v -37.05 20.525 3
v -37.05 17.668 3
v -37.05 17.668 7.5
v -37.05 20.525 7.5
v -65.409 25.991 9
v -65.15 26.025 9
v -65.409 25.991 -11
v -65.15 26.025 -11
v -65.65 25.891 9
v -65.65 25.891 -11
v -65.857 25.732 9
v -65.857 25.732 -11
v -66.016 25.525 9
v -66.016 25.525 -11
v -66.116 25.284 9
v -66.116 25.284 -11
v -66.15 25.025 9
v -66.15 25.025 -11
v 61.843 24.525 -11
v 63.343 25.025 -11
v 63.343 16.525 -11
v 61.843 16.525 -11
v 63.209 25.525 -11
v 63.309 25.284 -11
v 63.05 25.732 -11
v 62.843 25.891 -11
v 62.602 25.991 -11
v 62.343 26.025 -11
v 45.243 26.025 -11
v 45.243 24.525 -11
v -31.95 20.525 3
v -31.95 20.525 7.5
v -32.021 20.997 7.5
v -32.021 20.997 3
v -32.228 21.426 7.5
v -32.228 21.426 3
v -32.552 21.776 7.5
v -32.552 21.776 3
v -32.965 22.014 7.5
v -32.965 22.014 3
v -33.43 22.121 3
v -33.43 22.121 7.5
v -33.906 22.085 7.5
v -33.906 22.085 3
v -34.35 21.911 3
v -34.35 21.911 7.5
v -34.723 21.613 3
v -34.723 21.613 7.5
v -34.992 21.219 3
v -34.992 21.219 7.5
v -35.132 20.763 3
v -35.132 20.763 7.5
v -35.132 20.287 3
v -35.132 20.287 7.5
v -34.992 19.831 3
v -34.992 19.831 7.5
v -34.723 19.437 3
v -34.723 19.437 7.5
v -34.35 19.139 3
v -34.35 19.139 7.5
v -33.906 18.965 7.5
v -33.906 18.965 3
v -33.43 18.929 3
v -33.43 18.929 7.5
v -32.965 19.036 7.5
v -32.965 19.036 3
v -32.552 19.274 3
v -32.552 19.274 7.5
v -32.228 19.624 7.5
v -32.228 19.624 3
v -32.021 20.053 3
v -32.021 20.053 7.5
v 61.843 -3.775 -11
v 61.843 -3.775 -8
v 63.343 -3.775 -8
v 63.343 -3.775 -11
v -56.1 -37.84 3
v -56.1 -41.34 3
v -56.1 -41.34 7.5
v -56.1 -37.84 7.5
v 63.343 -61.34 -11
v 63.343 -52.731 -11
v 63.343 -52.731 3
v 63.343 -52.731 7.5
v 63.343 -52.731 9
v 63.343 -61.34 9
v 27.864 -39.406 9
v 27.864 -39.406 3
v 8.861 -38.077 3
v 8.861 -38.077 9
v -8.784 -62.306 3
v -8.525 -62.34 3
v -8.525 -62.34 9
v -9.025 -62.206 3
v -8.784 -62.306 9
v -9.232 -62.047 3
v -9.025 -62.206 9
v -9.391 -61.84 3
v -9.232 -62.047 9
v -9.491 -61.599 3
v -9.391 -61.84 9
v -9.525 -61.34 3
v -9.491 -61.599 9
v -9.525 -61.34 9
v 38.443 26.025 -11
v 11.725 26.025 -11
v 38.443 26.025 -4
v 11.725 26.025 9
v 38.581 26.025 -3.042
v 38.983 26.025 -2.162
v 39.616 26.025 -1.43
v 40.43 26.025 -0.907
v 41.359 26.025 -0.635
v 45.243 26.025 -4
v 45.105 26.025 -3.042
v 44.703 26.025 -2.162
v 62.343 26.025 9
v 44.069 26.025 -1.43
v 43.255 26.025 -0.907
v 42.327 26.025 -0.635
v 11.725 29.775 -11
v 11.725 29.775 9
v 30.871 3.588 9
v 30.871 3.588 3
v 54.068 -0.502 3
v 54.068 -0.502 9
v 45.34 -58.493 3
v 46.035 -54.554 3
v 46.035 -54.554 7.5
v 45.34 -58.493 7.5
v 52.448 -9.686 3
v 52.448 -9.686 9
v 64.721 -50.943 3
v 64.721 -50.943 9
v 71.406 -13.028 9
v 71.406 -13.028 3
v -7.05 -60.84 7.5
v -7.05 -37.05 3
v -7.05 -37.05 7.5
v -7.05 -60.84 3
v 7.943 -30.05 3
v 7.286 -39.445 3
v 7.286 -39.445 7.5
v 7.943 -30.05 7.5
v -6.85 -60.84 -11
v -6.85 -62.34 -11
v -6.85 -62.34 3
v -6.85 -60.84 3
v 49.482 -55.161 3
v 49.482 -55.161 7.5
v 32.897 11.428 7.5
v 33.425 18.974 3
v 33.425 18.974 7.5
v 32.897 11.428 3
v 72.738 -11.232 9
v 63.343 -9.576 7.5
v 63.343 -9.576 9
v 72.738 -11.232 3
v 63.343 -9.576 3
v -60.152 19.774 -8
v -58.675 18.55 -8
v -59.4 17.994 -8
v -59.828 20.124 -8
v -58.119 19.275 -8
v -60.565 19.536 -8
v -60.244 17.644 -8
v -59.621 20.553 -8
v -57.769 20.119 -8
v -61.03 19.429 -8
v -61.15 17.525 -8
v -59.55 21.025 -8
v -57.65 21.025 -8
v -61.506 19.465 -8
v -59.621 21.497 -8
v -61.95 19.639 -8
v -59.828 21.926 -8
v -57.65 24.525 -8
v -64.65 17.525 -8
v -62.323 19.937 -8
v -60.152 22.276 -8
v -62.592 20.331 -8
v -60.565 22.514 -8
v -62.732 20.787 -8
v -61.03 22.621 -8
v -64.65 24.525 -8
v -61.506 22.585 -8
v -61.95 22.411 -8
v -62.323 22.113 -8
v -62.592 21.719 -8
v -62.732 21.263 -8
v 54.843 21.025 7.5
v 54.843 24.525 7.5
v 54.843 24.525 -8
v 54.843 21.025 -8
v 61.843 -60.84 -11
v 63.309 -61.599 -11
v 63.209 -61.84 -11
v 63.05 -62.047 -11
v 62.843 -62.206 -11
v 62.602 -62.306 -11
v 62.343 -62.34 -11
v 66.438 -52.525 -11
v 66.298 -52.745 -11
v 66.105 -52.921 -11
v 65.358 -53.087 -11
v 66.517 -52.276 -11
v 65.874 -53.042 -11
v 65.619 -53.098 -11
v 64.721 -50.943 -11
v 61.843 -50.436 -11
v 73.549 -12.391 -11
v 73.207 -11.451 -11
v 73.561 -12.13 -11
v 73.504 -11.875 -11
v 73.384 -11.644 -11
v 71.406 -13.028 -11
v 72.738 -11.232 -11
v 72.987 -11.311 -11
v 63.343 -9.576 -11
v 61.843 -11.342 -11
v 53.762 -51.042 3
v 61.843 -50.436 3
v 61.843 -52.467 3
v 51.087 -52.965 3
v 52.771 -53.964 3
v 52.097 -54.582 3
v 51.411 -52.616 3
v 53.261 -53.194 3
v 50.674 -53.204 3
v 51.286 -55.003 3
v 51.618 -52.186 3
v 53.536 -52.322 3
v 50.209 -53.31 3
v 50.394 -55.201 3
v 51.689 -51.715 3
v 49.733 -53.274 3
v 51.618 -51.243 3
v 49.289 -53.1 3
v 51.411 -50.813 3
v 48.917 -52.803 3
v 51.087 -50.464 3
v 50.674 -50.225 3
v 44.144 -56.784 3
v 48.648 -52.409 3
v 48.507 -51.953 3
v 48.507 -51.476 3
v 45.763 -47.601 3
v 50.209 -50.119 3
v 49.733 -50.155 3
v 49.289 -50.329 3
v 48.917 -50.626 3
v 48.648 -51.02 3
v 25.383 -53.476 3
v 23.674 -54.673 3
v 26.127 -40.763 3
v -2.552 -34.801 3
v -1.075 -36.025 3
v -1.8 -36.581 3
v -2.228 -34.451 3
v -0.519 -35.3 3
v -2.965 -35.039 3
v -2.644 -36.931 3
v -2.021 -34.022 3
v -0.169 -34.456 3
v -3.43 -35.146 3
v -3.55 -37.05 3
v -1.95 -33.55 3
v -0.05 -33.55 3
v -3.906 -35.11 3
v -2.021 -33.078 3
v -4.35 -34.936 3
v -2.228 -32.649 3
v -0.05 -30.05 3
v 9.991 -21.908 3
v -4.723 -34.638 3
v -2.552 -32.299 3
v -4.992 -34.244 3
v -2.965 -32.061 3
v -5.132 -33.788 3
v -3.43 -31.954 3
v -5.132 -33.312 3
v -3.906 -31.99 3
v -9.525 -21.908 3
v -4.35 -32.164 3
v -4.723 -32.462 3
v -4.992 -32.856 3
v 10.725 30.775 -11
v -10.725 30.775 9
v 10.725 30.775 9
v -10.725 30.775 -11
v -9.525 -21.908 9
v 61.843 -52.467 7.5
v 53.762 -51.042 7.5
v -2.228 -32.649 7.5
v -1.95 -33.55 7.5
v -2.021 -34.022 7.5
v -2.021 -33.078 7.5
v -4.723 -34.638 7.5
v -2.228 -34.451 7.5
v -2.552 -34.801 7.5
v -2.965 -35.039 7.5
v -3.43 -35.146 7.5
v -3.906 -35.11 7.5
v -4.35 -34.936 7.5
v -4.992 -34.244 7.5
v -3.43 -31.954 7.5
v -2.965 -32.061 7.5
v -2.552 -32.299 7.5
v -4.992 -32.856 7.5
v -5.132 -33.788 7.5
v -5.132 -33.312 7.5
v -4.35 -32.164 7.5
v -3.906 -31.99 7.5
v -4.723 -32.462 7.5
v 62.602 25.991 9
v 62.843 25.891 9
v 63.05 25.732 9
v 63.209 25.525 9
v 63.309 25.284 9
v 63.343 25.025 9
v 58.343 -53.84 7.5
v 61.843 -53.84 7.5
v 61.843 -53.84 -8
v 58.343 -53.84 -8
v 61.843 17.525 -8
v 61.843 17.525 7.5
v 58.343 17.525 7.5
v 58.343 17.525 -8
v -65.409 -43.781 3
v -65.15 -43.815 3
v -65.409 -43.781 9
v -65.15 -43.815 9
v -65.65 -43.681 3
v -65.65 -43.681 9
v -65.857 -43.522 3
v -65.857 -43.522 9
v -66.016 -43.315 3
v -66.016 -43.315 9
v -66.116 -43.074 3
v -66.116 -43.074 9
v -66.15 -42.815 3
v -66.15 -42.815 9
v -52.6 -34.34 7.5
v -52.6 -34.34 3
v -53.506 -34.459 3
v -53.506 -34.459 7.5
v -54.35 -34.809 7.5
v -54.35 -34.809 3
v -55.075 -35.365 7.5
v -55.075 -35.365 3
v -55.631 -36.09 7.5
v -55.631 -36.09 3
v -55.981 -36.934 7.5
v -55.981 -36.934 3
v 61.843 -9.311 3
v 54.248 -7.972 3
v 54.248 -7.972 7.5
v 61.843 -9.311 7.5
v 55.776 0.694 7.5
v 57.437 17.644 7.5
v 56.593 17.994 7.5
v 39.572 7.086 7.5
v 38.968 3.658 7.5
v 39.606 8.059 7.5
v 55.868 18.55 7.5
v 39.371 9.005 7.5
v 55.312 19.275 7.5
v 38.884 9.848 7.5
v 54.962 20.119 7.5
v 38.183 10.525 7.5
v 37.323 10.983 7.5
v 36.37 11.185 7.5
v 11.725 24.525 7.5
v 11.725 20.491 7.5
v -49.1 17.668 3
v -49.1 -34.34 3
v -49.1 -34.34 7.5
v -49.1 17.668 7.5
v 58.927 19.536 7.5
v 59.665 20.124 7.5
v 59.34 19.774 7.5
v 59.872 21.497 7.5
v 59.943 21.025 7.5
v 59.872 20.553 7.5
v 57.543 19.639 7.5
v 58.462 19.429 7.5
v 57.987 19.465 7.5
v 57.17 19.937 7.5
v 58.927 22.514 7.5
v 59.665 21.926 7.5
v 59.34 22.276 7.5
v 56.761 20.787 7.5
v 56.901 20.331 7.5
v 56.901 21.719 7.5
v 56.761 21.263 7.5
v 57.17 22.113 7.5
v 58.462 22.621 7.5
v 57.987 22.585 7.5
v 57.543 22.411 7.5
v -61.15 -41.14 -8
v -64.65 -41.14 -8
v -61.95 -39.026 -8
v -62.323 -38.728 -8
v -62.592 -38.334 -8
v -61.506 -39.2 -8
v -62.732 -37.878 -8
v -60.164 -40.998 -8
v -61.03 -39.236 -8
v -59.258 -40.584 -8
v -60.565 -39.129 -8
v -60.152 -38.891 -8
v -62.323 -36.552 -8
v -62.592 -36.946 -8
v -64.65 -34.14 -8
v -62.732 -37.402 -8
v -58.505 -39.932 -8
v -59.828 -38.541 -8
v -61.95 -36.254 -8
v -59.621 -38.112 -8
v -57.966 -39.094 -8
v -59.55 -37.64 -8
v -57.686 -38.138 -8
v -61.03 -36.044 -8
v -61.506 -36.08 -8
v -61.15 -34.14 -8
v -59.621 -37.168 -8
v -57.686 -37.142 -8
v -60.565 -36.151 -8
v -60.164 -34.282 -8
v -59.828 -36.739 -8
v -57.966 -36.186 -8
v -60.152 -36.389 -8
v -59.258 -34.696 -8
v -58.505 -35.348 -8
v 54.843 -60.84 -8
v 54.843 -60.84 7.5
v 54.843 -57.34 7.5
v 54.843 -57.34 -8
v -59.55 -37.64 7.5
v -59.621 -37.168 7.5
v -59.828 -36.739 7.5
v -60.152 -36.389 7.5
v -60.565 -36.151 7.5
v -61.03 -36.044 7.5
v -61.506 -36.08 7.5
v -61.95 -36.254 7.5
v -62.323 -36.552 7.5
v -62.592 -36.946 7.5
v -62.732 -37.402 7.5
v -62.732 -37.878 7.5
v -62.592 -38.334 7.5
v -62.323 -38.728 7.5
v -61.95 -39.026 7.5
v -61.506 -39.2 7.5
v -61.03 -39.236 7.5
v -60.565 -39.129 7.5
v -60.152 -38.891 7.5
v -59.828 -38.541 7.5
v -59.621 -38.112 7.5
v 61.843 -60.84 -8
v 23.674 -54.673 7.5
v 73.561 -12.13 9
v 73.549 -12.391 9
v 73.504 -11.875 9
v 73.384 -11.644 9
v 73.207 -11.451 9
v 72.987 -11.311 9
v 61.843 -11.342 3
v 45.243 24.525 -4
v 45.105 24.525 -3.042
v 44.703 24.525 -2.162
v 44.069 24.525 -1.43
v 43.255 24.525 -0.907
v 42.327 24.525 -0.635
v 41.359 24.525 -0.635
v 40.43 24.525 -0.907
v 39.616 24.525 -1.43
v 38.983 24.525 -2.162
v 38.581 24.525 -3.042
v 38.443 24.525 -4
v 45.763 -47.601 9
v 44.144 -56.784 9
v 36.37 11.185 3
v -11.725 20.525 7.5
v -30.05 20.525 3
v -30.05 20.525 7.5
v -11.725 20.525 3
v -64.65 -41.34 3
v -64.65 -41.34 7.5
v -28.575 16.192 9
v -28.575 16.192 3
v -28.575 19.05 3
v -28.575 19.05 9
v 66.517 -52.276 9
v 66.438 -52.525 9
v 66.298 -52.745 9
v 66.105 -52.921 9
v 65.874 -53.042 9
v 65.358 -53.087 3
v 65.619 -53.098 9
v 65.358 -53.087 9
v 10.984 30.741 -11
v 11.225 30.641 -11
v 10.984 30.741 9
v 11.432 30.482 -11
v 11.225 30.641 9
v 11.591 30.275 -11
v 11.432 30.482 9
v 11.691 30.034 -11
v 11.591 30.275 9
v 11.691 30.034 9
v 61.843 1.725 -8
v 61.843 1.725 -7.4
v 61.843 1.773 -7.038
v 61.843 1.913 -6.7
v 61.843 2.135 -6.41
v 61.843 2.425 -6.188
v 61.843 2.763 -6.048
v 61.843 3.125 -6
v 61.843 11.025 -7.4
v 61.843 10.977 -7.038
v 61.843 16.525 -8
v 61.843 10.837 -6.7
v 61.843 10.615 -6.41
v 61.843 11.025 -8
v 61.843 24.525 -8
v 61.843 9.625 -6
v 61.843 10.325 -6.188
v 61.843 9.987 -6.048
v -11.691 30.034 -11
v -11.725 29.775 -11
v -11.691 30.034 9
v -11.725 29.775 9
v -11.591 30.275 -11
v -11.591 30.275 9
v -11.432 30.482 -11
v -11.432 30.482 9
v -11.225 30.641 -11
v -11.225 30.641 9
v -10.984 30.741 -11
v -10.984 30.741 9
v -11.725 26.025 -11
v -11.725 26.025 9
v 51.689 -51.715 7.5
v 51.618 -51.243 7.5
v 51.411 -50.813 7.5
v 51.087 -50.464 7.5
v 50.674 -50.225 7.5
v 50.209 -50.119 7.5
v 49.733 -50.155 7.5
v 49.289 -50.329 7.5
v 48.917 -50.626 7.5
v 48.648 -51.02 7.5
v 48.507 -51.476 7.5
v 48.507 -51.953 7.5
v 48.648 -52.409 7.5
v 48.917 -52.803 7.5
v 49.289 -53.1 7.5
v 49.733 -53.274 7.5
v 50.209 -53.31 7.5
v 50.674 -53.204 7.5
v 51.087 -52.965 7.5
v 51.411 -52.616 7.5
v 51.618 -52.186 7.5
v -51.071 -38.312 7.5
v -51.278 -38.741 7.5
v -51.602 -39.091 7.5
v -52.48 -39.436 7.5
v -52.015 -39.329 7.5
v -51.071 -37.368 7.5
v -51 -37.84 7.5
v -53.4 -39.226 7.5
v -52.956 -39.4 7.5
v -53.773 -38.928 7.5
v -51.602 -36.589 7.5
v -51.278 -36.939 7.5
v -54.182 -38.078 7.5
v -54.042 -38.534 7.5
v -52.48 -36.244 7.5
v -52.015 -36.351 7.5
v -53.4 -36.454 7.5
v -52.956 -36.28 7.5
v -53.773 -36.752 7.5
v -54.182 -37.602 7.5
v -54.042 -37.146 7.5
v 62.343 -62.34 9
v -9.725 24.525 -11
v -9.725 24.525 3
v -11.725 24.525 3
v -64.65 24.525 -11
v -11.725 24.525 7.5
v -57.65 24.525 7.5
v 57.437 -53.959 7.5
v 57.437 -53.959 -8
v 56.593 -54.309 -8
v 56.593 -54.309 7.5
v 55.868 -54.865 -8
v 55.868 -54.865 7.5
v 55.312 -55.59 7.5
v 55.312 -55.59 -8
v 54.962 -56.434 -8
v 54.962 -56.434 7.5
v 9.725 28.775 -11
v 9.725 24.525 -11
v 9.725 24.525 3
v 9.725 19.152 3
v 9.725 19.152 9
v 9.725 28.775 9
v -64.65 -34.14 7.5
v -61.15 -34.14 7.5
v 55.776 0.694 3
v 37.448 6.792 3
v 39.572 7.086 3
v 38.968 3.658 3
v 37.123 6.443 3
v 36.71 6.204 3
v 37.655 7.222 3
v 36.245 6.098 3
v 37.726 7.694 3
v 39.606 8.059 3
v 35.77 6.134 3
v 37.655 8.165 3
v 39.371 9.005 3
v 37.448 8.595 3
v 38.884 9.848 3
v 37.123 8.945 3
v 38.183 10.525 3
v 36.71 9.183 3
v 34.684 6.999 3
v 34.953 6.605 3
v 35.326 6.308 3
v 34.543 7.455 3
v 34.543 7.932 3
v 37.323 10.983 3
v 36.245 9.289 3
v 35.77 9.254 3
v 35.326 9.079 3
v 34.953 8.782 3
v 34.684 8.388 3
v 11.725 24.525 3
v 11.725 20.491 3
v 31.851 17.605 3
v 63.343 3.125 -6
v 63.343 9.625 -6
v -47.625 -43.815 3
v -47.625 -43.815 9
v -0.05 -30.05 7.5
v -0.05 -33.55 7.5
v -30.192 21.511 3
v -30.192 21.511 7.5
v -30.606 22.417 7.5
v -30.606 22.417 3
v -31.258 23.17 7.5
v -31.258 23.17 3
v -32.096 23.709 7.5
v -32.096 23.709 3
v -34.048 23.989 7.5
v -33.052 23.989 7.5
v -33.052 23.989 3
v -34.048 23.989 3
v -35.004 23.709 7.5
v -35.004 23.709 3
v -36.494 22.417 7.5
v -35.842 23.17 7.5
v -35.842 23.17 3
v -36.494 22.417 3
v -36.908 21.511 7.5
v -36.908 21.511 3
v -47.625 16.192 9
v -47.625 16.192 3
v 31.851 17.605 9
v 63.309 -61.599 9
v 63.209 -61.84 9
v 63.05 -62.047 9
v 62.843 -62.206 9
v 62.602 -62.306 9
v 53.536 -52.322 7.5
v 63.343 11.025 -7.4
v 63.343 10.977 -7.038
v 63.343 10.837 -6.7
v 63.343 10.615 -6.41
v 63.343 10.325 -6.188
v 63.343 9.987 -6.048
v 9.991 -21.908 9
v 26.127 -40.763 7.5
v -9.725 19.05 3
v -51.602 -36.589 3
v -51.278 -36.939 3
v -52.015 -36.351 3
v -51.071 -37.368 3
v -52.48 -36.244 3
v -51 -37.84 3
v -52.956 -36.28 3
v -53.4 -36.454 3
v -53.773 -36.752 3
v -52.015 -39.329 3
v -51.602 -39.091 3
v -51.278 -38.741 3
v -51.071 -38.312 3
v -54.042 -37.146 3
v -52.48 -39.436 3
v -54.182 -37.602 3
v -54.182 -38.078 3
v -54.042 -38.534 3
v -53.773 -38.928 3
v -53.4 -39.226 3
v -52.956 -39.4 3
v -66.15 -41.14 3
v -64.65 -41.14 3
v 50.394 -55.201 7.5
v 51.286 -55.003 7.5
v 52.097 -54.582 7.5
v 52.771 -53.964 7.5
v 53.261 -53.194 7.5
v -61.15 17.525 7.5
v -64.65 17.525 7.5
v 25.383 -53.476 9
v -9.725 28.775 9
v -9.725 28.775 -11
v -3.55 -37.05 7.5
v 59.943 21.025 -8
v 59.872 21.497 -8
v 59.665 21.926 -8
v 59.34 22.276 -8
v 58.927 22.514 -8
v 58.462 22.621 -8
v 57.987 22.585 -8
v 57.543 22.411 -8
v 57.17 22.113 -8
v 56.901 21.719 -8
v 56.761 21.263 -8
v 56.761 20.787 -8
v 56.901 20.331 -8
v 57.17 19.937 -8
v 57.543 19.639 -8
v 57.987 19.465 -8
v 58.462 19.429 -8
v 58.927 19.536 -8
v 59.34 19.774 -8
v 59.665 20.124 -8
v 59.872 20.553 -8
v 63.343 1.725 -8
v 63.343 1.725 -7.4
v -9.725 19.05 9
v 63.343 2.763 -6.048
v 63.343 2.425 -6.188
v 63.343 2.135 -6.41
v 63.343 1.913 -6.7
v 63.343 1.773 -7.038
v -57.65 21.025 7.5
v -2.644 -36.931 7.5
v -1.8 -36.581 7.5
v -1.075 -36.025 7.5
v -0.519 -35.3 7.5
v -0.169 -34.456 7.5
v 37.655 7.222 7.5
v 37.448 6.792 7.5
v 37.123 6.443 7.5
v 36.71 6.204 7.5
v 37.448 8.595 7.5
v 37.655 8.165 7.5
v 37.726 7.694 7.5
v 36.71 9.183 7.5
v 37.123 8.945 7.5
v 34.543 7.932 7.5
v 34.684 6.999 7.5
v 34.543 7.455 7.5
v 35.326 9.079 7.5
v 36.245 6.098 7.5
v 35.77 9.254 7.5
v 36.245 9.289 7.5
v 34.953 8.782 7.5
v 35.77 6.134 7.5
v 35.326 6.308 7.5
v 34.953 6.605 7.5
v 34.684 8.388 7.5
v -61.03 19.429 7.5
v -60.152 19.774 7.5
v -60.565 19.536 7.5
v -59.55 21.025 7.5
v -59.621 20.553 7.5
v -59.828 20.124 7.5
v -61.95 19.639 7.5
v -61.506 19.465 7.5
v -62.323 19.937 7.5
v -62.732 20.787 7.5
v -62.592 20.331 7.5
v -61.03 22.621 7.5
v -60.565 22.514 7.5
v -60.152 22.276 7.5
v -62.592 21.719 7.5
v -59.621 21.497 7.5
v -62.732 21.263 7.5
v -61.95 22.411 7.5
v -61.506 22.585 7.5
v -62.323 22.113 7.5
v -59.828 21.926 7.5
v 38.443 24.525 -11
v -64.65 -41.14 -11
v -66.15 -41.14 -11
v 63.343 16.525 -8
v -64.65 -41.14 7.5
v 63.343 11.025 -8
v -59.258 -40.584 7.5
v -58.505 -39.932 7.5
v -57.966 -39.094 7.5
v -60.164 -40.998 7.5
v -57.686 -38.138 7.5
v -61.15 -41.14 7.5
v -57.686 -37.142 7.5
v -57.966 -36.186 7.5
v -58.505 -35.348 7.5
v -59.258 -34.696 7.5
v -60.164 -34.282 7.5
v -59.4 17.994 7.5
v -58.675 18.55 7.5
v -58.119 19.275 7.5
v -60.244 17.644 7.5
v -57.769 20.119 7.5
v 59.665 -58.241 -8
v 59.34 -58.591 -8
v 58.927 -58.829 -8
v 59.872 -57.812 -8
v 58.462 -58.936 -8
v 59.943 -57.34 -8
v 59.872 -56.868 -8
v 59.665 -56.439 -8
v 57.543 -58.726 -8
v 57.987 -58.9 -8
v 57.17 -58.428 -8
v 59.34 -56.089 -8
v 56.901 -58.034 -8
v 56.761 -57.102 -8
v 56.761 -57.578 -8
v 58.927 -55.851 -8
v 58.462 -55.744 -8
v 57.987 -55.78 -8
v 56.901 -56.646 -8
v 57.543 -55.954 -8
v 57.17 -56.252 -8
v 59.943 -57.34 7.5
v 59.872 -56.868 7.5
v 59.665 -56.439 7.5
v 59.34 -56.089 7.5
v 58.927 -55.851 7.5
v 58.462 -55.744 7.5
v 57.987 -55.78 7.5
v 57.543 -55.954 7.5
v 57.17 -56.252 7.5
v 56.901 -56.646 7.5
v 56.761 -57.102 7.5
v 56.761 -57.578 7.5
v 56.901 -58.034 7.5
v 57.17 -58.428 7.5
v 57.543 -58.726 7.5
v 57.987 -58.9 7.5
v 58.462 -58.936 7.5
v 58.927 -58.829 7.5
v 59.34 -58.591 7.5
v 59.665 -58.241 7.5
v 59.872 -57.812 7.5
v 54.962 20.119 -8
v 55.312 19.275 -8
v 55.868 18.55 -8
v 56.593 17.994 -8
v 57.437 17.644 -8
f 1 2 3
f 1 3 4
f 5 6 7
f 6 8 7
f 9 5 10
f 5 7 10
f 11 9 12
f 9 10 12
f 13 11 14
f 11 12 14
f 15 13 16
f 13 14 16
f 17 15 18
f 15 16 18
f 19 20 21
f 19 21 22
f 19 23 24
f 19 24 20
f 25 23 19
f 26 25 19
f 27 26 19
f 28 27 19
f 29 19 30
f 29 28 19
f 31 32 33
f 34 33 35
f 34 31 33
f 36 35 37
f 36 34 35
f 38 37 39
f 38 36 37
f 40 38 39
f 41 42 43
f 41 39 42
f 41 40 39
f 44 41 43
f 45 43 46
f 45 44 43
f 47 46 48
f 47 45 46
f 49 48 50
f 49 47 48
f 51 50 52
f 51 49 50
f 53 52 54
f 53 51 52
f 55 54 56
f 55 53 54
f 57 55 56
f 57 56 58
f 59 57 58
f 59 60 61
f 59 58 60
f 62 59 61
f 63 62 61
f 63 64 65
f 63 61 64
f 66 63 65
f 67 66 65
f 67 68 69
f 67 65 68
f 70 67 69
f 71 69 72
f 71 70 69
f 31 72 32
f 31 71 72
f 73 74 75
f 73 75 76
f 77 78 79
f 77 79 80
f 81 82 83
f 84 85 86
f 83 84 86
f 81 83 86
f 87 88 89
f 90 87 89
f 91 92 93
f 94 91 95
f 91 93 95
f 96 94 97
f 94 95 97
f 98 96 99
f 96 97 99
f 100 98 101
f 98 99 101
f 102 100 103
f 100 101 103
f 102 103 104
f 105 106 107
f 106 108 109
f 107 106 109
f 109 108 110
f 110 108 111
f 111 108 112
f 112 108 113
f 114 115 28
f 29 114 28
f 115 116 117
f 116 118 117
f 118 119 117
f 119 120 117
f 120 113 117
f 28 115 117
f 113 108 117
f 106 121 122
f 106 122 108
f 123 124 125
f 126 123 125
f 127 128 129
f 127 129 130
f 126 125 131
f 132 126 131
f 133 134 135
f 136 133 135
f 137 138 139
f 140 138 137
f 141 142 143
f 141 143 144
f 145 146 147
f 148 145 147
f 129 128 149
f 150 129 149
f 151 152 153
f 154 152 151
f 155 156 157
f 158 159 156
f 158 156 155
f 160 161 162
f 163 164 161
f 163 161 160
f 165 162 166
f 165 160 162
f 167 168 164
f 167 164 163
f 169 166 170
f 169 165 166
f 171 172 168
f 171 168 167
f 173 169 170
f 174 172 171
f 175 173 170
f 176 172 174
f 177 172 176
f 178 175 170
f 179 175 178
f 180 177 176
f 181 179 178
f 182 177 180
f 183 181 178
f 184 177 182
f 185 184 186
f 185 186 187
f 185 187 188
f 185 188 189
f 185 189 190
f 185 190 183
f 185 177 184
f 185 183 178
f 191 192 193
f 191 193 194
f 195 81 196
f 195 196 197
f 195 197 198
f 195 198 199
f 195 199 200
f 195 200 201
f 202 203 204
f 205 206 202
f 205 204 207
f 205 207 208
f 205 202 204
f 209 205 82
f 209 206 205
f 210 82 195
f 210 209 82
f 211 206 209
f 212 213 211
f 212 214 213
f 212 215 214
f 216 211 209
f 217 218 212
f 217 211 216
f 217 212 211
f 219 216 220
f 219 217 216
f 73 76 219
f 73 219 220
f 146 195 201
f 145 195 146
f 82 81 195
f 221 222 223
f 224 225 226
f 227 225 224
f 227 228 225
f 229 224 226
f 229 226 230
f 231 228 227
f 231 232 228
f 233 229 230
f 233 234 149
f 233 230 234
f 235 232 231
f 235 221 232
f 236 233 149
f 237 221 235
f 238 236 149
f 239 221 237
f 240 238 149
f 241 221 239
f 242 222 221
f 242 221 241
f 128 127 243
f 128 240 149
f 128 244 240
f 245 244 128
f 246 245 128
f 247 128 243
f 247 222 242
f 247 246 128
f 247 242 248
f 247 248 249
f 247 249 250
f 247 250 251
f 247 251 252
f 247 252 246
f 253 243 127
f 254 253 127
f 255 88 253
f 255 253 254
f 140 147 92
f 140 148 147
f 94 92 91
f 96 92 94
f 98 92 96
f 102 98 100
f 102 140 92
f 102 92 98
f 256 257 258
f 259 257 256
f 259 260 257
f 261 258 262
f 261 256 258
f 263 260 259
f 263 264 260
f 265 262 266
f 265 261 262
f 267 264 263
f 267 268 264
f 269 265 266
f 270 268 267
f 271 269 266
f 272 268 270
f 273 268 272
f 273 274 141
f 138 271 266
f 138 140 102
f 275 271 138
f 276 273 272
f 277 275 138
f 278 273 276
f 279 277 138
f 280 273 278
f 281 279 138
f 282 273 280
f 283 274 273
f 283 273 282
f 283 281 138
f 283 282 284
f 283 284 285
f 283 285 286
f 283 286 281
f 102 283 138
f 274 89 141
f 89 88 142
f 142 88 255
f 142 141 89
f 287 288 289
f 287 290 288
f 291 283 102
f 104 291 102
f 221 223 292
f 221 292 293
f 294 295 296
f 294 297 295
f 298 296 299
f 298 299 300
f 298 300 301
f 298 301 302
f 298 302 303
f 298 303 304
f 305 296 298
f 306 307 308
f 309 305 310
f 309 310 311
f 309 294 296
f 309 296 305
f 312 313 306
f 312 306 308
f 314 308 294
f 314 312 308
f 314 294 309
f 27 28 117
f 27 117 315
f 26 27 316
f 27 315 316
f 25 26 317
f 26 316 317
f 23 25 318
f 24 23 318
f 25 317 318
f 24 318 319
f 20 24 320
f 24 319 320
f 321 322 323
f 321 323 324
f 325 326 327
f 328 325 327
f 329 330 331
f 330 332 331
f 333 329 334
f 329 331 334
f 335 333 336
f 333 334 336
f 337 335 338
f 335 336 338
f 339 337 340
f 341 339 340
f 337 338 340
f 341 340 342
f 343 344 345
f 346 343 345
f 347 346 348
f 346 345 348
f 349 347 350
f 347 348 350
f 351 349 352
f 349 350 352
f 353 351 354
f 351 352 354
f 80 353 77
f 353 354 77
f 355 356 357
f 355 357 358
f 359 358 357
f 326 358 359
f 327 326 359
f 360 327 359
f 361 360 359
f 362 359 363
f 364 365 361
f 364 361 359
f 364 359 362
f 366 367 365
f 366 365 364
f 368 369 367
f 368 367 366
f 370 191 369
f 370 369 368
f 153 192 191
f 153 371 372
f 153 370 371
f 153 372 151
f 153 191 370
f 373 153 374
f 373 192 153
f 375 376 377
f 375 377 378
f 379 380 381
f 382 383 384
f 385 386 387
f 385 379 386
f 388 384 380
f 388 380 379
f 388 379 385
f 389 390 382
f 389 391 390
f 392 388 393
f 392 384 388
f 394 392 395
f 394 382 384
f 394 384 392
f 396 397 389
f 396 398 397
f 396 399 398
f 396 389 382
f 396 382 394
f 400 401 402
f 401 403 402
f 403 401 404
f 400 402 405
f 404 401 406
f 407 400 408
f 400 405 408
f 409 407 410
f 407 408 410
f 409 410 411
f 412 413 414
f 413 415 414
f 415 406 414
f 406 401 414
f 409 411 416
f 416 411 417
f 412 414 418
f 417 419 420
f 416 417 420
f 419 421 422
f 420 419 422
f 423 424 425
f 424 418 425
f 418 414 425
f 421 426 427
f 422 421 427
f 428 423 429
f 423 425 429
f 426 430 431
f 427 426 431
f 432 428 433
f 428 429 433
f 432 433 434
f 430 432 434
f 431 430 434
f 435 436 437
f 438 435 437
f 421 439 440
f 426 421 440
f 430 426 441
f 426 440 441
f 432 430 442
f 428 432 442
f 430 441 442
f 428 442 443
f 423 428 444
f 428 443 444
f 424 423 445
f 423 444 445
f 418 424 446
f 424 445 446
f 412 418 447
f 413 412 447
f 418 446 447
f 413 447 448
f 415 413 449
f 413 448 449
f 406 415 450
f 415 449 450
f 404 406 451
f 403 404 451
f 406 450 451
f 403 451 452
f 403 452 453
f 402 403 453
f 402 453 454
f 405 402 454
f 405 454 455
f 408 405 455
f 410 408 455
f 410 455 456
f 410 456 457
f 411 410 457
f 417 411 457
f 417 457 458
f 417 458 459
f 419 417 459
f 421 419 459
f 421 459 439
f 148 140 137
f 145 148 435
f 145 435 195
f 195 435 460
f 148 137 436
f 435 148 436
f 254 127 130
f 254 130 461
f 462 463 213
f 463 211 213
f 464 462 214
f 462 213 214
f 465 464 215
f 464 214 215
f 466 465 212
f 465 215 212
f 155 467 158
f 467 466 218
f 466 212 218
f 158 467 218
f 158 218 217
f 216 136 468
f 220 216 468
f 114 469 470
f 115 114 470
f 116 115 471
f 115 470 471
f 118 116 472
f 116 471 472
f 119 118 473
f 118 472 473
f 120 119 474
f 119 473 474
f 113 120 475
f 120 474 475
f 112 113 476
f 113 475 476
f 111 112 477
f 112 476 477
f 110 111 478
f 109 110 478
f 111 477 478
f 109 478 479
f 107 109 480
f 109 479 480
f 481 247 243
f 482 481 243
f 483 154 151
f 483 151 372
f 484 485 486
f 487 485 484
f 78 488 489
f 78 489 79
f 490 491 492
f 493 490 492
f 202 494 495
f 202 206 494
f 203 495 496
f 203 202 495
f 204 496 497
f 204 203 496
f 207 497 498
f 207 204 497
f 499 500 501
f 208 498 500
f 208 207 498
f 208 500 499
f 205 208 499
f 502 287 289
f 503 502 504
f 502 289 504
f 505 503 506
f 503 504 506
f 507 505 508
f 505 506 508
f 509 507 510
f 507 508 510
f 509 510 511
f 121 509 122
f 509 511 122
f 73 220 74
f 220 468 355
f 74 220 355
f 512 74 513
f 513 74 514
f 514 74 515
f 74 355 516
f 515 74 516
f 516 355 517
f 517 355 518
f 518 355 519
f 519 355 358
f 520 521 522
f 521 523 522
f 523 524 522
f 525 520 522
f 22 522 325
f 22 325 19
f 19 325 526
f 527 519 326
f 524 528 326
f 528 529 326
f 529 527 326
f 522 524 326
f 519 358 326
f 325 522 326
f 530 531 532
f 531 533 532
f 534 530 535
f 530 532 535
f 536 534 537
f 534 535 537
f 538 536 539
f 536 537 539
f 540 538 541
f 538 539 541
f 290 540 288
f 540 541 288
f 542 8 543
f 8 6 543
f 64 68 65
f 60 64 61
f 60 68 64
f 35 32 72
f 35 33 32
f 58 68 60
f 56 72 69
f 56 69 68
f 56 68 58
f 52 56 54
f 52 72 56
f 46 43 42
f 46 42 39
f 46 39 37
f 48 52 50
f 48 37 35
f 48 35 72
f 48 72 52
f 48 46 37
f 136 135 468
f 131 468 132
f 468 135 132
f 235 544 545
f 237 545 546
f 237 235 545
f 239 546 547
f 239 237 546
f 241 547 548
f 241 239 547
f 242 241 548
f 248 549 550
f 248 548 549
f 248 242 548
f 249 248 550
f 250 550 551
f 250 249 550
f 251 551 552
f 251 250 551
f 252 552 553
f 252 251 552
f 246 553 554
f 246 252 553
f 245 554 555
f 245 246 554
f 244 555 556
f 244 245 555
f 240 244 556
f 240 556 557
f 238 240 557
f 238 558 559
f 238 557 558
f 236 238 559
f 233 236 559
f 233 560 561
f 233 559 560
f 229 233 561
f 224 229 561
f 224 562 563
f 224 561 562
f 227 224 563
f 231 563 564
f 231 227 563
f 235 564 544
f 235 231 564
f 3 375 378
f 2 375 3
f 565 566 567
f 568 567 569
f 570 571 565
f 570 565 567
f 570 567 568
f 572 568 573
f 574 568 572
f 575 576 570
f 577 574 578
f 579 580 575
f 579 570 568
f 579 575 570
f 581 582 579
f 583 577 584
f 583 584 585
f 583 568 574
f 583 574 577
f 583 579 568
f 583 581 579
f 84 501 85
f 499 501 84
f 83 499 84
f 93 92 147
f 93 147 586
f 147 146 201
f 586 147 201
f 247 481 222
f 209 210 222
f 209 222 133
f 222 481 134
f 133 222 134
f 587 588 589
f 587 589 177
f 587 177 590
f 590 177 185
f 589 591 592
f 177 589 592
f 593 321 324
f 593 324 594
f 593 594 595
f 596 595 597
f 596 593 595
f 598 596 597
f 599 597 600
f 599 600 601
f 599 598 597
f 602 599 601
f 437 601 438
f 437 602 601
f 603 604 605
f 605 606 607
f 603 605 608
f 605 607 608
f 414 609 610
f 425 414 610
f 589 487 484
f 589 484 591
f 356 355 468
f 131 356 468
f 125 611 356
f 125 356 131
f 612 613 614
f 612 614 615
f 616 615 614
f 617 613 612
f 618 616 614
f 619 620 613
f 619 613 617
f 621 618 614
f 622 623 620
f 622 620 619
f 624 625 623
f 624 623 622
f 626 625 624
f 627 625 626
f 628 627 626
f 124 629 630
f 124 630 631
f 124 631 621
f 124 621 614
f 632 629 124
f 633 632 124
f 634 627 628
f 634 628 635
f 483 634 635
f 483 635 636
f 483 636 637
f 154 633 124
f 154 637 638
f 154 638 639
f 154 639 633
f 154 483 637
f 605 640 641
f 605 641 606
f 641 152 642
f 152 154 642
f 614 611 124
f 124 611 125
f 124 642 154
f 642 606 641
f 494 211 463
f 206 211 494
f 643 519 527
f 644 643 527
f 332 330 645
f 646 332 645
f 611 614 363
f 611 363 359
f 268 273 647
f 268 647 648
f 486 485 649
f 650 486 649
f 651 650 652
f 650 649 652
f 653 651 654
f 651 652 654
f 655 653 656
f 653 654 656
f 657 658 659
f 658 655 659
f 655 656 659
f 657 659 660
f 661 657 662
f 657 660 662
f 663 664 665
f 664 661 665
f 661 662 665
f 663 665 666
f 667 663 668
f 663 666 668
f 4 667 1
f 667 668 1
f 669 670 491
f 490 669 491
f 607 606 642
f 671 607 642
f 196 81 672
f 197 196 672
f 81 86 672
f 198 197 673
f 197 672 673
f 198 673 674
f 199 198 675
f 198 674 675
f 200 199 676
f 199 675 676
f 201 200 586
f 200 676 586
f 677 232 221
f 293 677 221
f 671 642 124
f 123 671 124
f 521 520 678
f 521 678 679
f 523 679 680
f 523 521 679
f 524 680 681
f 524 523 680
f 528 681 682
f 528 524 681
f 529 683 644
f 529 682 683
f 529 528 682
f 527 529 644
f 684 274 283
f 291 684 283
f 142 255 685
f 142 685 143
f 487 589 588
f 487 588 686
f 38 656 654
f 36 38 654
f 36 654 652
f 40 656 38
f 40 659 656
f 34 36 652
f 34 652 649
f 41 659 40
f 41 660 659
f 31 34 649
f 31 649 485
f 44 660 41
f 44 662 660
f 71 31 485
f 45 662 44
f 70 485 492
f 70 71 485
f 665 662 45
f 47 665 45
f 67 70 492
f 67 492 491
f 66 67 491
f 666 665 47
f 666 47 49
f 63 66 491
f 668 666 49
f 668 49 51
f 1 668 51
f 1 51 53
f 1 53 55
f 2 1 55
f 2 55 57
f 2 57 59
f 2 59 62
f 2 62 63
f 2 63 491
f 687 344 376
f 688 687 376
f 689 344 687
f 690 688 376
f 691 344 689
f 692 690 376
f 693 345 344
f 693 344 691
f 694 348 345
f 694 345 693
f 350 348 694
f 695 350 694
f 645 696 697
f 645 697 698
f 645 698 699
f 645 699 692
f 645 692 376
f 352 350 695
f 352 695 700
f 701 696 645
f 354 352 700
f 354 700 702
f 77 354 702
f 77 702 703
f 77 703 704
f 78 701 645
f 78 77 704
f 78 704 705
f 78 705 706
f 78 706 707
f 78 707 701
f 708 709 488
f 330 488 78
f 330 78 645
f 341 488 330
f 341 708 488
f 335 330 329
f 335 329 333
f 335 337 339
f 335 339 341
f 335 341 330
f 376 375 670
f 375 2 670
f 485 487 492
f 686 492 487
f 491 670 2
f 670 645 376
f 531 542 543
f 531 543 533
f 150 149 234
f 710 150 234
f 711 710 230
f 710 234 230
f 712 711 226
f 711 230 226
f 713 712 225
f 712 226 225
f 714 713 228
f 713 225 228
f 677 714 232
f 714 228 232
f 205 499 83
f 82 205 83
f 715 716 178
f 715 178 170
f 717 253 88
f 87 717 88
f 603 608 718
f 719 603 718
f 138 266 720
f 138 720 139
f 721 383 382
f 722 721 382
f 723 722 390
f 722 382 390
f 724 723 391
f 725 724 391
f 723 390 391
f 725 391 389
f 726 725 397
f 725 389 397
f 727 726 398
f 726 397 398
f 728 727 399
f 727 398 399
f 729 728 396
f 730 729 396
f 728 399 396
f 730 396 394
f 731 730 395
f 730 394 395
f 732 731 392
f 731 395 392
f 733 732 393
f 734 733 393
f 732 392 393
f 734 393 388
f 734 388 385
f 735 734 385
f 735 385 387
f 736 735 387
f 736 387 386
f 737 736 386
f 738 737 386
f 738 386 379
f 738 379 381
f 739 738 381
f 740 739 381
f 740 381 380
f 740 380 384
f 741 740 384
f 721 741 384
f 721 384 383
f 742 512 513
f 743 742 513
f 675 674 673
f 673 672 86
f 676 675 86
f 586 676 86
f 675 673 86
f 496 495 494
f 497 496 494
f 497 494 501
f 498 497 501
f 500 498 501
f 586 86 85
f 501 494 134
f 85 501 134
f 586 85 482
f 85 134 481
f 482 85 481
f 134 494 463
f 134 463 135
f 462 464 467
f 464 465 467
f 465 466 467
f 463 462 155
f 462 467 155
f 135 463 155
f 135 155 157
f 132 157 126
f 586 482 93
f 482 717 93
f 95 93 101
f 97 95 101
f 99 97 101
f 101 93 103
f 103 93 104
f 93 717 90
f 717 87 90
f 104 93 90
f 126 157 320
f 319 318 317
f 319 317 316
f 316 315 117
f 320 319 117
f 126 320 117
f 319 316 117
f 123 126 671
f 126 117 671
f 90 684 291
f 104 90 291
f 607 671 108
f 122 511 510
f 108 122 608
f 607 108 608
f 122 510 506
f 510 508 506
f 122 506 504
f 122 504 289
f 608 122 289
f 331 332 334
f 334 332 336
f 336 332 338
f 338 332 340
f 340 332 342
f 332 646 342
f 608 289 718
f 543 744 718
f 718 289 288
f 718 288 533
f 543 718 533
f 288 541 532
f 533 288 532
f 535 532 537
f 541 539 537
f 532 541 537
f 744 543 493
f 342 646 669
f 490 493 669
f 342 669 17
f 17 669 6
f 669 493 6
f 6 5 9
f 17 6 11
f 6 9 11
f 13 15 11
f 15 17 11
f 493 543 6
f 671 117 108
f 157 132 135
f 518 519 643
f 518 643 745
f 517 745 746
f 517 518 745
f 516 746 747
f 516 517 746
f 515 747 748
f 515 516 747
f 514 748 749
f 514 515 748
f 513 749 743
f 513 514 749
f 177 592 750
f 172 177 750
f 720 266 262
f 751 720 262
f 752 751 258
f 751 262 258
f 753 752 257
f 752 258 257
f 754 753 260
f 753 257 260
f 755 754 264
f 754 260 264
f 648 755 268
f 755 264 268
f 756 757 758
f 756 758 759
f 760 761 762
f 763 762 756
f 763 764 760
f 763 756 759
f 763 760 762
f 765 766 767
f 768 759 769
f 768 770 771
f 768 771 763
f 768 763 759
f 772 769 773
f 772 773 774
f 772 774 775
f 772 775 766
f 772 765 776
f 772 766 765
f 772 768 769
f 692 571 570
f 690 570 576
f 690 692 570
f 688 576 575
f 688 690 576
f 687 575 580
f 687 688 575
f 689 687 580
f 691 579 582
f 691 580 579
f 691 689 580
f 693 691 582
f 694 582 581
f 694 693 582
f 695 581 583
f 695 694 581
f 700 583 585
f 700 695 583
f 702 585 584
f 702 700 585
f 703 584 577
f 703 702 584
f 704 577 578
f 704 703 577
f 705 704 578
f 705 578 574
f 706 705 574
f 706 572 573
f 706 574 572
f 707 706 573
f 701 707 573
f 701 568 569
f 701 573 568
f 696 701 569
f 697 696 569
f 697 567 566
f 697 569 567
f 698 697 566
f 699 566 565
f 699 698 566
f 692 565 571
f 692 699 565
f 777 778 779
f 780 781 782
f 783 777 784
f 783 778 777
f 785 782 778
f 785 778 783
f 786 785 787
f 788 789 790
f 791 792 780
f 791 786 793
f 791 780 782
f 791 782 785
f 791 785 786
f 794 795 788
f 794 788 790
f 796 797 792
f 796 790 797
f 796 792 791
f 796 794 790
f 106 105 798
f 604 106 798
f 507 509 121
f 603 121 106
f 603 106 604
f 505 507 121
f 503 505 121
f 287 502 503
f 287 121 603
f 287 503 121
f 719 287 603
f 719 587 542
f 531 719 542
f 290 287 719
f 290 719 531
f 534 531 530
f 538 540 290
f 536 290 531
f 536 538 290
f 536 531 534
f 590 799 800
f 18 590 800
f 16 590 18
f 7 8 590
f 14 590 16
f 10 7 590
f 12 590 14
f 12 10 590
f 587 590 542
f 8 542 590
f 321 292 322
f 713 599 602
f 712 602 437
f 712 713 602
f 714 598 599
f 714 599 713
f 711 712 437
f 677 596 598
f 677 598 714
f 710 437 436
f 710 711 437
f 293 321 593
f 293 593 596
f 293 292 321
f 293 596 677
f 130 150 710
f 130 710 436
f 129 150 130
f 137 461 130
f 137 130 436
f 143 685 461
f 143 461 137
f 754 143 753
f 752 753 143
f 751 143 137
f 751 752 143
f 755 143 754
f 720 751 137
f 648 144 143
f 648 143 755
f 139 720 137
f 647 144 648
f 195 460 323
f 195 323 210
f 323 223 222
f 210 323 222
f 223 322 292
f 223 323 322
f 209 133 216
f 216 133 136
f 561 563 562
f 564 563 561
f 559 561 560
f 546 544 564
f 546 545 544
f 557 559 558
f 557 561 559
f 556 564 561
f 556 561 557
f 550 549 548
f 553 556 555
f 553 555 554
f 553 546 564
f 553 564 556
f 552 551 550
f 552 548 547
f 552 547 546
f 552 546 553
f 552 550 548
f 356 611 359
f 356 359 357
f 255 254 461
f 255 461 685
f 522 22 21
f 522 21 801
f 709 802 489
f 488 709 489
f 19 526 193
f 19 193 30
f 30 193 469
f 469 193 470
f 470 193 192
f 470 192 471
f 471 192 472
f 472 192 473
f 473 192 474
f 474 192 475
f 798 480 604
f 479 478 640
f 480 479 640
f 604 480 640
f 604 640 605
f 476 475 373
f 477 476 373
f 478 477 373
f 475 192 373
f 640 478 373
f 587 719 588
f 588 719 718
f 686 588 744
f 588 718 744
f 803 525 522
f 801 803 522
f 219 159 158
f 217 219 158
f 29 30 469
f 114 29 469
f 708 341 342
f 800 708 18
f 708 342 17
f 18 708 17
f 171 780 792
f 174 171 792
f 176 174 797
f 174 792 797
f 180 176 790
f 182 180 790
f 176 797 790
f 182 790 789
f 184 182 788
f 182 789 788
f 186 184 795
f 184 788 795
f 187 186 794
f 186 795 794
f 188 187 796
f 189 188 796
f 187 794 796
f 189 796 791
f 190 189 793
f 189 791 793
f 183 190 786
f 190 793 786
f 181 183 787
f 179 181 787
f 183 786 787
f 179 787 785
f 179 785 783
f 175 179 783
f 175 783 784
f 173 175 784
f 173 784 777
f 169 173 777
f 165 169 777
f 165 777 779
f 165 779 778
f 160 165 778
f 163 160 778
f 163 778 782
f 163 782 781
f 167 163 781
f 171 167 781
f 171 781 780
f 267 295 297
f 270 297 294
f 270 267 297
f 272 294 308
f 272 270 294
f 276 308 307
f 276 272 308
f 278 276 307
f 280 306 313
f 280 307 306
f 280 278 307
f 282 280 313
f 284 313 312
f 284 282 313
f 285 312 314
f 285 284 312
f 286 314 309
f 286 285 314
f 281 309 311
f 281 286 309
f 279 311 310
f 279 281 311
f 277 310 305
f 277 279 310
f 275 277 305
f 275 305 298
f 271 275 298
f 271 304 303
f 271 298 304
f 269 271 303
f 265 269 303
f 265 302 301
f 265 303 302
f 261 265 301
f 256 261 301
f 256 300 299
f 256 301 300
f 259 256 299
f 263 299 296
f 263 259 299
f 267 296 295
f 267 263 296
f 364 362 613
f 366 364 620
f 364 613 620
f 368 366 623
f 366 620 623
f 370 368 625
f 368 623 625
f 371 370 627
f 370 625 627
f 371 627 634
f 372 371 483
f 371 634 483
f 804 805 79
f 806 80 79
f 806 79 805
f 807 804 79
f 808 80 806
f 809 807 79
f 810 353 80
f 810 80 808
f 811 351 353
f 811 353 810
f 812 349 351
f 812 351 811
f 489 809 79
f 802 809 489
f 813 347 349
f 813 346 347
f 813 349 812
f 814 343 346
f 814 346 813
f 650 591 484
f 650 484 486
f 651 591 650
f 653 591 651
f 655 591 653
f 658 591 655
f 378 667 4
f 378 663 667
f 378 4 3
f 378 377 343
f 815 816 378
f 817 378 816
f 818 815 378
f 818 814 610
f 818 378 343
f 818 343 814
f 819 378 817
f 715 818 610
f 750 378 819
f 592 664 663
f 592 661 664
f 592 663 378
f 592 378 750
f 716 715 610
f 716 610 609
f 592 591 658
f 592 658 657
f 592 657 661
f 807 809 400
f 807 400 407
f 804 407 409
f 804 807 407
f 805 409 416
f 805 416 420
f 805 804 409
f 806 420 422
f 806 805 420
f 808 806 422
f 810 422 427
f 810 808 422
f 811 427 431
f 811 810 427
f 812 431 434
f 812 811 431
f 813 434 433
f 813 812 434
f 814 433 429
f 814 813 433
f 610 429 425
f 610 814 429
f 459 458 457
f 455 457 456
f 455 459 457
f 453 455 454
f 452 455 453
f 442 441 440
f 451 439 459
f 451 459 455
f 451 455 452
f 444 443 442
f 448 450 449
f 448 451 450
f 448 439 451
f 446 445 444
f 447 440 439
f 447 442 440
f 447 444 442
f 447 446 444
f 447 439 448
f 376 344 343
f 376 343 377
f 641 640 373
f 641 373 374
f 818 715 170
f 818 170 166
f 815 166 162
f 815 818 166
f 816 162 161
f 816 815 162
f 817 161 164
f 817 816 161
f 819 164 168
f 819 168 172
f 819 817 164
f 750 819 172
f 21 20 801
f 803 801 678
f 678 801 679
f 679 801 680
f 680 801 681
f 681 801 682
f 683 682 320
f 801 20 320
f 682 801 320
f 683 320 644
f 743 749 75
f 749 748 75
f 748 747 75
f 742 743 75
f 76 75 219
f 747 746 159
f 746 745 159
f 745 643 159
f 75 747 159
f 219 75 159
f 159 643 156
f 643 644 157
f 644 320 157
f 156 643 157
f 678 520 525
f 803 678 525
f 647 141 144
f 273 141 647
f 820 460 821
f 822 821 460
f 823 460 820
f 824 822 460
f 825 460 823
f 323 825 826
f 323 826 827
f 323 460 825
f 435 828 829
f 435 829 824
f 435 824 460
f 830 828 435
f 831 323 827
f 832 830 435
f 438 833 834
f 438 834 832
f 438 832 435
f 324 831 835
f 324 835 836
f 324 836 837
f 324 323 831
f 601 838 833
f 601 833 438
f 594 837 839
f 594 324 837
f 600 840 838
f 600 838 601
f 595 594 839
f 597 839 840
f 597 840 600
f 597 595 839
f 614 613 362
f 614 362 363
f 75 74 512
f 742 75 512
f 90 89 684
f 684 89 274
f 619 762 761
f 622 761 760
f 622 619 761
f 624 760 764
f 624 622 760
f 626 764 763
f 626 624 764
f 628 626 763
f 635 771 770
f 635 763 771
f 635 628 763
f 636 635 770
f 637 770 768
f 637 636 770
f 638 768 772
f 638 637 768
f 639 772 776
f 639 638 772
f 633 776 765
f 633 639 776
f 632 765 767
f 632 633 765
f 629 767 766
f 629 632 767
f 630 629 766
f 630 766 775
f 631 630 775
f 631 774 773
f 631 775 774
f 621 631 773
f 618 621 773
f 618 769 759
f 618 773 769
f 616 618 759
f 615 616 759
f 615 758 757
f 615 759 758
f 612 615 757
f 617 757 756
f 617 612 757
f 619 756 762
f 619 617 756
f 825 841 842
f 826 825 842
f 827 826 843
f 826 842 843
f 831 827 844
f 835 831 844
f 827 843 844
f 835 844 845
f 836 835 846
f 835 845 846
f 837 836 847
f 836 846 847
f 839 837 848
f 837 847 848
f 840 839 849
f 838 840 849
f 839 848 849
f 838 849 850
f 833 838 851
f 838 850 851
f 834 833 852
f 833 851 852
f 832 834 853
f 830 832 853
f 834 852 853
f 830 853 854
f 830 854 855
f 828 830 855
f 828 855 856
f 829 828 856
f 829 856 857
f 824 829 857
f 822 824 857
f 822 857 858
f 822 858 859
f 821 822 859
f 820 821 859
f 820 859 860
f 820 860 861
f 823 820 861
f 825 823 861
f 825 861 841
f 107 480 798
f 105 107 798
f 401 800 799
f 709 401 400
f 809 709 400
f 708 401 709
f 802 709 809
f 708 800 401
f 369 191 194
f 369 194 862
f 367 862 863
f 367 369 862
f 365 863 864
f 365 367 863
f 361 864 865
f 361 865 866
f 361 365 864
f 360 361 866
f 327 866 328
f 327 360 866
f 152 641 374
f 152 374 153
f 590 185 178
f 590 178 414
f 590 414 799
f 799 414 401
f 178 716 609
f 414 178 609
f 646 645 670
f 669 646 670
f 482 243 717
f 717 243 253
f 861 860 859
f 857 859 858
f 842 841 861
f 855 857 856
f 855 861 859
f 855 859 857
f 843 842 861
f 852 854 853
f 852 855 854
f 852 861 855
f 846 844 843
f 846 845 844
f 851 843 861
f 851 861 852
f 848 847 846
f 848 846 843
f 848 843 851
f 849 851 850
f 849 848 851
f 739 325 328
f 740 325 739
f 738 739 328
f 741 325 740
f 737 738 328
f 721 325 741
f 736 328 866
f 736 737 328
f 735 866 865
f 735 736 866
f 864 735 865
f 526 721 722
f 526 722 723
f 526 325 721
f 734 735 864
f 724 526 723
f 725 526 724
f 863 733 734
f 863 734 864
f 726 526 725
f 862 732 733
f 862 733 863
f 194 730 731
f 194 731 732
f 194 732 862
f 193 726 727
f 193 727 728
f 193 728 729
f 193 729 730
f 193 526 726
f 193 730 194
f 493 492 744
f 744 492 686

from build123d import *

# Parameters (mm, degrees)
SKETCH029_R     = 1.6
PAD013_DEPTH    = 6
POCKET001_DEPTH = 6.001
POCKET002_DEPTH = 6.001
PAD014_DEPTH    = 1.5
PAD015_DEPTH    = 20
SKETCH034_W     = 0.2
SKETCH034_H     = 14
POCKET003_DEPTH = 1.5
SKETCH035_W     = 0.2
SKETCH035_H     = 14
POCKET004_DEPTH = 1.5
SKETCH036_R     = 1.6
PAD016_DEPTH    = 17
POCKET005_DEPTH = 11.8810475508
POCKET006_DEPTH = 6.251
FILLET001_R     = 1


with BuildPart() as part:
    # Sketch029 (on Face1 of Binder) → Pad013 (new body)
    with BuildSketch(Plane.XY.offset(3)):
        with BuildLine():
            Line((-66.15, -41.34), (-56.1, -41.34))
            Line((-56.1, -41.34), (-56.1, -37.84))
            ThreePointArc((-52.6, -34.34), (-55.0748725626, -35.3651274374), (-56.1, -37.84))
            Line((-52.6, -34.34), (-49.1, -34.34))
            Line((-49.1, -34.34), (-49.1, 17.6675))
            Line((-49.1, 17.6675), (-37.05, 17.6675))
            Line((-37.05, 17.6675), (-37.05, 20.525))
            ThreePointArc((-30.05, 20.525), (-33.55, 24.025), (-37.05, 20.525))
            Line((-30.05, 20.525), (-11.725, 20.525))
            Line((-11.725, 20.525), (-11.725, 30.775))
            Line((-11.725, 30.775), (11.725, 30.775))
            Line((11.725, 30.775), (11.725, 20.4910582095))
            Line((11.725, 20.4910582095), (33.4250449924, 18.9736432442))
            Line((33.4250449924, 18.9736432442), (32.8973962111, 11.4279141223))
            Line((32.8973962111, 11.4279141223), (36.3697437262, 11.1851039306))
            ThreePointArc((39.5724232036, 7.0858611329), (38.8836355297, 9.8484463434), (36.3697437262, 11.1851039306))
            Line((39.5724232036, 7.0858611329), (38.9679840019, 3.657916077))
            Line((38.9679840019, 3.657916077), (55.7764699529, 0.694126499))
            Line((55.7764699529, 0.694126499), (54.2483659895, -7.9721817275))
            Line((54.2483659895, -7.9721817275), (73.7229393053, -11.4060744409))
            Line((73.7229393053, -11.4060744409), (66.3428917544, -53.2604039439))
            Line((66.3428917544, -53.2604039439), (53.7619727097, -51.0420484742))
            Line((53.5362300787, -52.3222985531), (53.7619727097, -51.0420484742))
            ThreePointArc((49.4816343214, -55.1613570668), (52.0969209571, -54.5815627814), (53.5362300787, -52.3222985531))
            Line((46.0348071858, -54.553588445), (49.4816343214, -55.1613570668))
            Line((46.0348071858, -54.553588445), (45.3402144751, -58.492819457))
            Line((45.3402144751, -58.492819457), (23.6744439088, -54.6725595483))
            Line((23.6744439088, -54.6725595483), (26.1271109464, -40.7627935689))
            Line((26.1271109464, -40.7627935689), (7.2862718147, -39.4453137541))
            Line((7.2862718147, -39.4453137541), (7.9432561527, -30.05))
            Line((7.9432561527, -30.05), (-0.05, -30.05))
            Line((-0.05, -30.05), (-0.05, -33.55))
            ThreePointArc((-3.55, -37.05), (-1.0751246396, -36.0248753604), (-0.05, -33.55))
            Line((-3.55, -37.05), (-7.05, -37.05))
            Line((-7.05, -37.05), (-7.05, -62.34))
            Line((-9.525, -62.34), (-7.05, -62.34))
            Line((-9.525, -21.9075), (-9.525, -62.34))
            Line((9.9912370186, -21.9075), (-9.525, -21.9075))
            Line((8.8605695876, -38.0767975787), (9.9912370186, -21.9075))
            Line((27.864164745, -39.4056584035), (8.8605695876, -38.0767975787))
            Line((25.3831664066, -53.4760991747), (27.864164745, -39.4056584035))
            Line((44.1437541015, -56.7840969593), (25.3831664066, -53.4760991747))
            Line((45.7977529938, -47.4038031118), (44.1437541015, -56.7840969593))
            Line((64.5583406887, -50.7118008964), (45.7977529938, -47.4038031118))
            Line((71.1743362578, -13.1906255066), (64.5583406887, -50.7118008964))
            Line((52.4137485629, -9.8826277221), (71.1743362578, -13.1906255066))
            Line((54.0677474552, -0.5023338746), (52.4137485629, -9.8826277221))
            Line((30.870571009, 3.5879542091), (54.0677474552, -0.5023338746))
            Line((31.8507472195, 17.6051270688), (30.870571009, 3.5879542091))
            Line((9.525, 19.1662953961), (31.8507472195, 17.6051270688))
            Line((9.525, 28.575), (9.525, 19.1662953961))
            Line((-9.525, 28.575), (9.525, 28.575))
            Line((-9.525, 19.05), (-9.525, 28.575))
            Line((-28.575, 19.05), (-9.525, 19.05))
            Line((-28.575, 16.1925), (-28.575, 19.05))
            Line((-47.625, 16.1925), (-28.575, 16.1925))
            Line((-47.625, -43.815), (-47.625, 16.1925))
            Line((-66.15, -43.815), (-47.625, -43.815))
            Line((-66.15, -41.34), (-66.15, -43.815))
        make_face()
        with Locations((-33.55, 20.525)):
            Circle(SKETCH029_R, mode=Mode.SUBTRACT)
        with Locations((-52.599996, -37.840004)):
            Circle(SKETCH029_R, mode=Mode.SUBTRACT)
        with Locations((-3.5499944477, -33.5500055523)):
            Circle(SKETCH029_R, mode=Mode.SUBTRACT)
        with Locations((50.0894046049, -51.7145323045)):
            Circle(SKETCH029_R, mode=Mode.SUBTRACT)
        with Locations((36.1256015808, 7.6936340617)):
            Circle(SKETCH029_R, mode=Mode.SUBTRACT)
    extrude(amount=PAD013_DEPTH)

    # Sketch030 (on Vertex106 of Pad013) → Pocket001 (cut, through all)
    with BuildSketch(Plane(origin=(9.525, 28.575, 9), x_dir=(1, 0, 0), z_dir=(0, 0, 1))):
        Polygon((0, 0), (0, -19.05), (0.2, -19.05), (0.2, 0.2), (-19.25, 0.2), (-19.25, -19.05), (-19.05, -19.05), (-19.05, 0), align=None)
    extrude(amount=-POCKET001_DEPTH, mode=Mode.SUBTRACT)

    # Sketch031 (on Vertex111 of Pocket001) → Pocket002 (cut, through all)
    with BuildSketch(Plane(origin=(64.5583406887, -50.7118008964, 9), x_dir=(1, 0, 0), z_dir=(0, 0, 1))):
        Polygon((6.6159955691, 37.5211753898), (0, 0), (-18.7605876949, 3.3079977846), (-18.7953173304, 3.111036234), (0.1622319151, -0.2316911861), (6.8476867552, 37.6834073048), (-12.1098624902, 41.0261347249), (-12.1445921258, 40.8291731743), align=None)
    extrude(amount=-POCKET002_DEPTH, mode=Mode.SUBTRACT)

    # Sketch032 (on Face5 of Pocket002) → Pad014 (join)
    with BuildSketch(Plane(origin=(0, 0, 9), x_dir=(-1, 0, 0), z_dir=(0, 0, -1))):
        Polygon((11.725, 26.025), (11.725, 19.05), (28.575, 19.05), (28.575, 16.1925), (47.625, 16.1925), (47.625, -43.815), (66.15, -43.815), (66.15, 26.025), align=None)
        Polygon((-11.725, 26.025), (-63.3428917544, 26.025), (-63.3428917544, -11.6066452204), (-52.4484781984, -9.6856661715), (-54.0677474552, -0.5023338746), (-30.870571009, 3.5879542091), (-31.8507472195, 17.6051270688), (-11.725, 19.0124564098), align=None)
        Polygon((9.525, -62.34), (9.525, -21.9075), (-9.9912370186, -21.9075), (-8.8605695876, -38.0767975787), (-27.864164745, -39.4056584035), (-25.3831664066, -53.4760991747), (-44.1437541015, -56.7840969593), (-45.7630233582, -47.6007646624), (-63.3428917544, -50.700569778), (-63.3428917544, -62.34), align=None)
    extrude(amount=PAD014_DEPTH)

    # Sketch033 (on Face78 of Pad014) → Pad015 (join)
    with BuildSketch(Plane(origin=(0, 0, 9), x_dir=(-1, 0, 0), z_dir=(0, 0, -1))):
        Polygon((66.15, -41.34), (66.15, 26.025), (11.725, 26.025), (11.725, 30.775), (-11.725, 30.775), (-11.725, 26.025), (-63.3428917544, 26.025), (-63.3428917544, -9.5757919966), (-73.7229393053, -11.4060744409), (-66.3428917544, -53.2604039439), (-63.3428917544, -52.7314230018), (-63.3428917544, -62.34), (7.05, -62.34), (7.05, -60.84), (-61.8428917544, -60.84), (-61.8428917544, -50.4360793069), (-64.7205726037, -50.9434920825), (-71.4060274439, -13.0283935916), (-61.8428917544, -11.3421547493), (-61.8428917544, 24.525), (-9.725, 24.525), (-9.725, 28.775), (9.725, 28.775), (9.725, 24.525), (64.65, 24.525), (64.65, -41.34), align=None)
    extrude(amount=PAD015_DEPTH)

    # Sketch034 (on Vertex1 of Pad015) → Pocket003 (cut)
    with BuildSketch(Plane(origin=(-66.15, -41.34, 3), x_dir=(0, -1, 0), z_dir=(-1, 0, 0))):
        with Locations((-0.1, -7)):
            Rectangle(SKETCH034_W, SKETCH034_H)
    extrude(amount=-POCKET003_DEPTH, mode=Mode.SUBTRACT)

    # Sketch035 → Pocket004 (cut)
    with BuildSketch(Plane(origin=(-7.05, -62.34, 3), x_dir=(1, 0, 0), z_dir=(0, -1, 0))):
        with Locations((0.1, -7)):
            Rectangle(SKETCH035_W, SKETCH035_H)
    extrude(amount=-POCKET004_DEPTH, mode=Mode.SUBTRACT)

    # Sketch036 (on Face27 of Pocket004) → Pad016 (join)
    with BuildSketch(Plane.XY.offset(9)):
        with BuildLine():
            Line((-64.65, 24.525), (-57.65, 24.525))
            Line((-57.65, 24.525), (-57.65, 21.025))
            ThreePointArc((-61.15, 17.525), (-58.6751262658, 18.5501262658), (-57.65, 21.025))
            Line((-64.65, 17.525), (-61.15, 17.525))
            Line((-64.65, 24.525), (-64.65, 17.525))
        make_face()
        with Locations((-61.15, 21.025)):
            Circle(SKETCH036_R, mode=Mode.SUBTRACT)
        with BuildLine():
            Line((-64.65, -34.14), (-64.65, -41.14))
            Line((-64.65, -41.14), (-61.15, -41.14))
            ThreePointArc((-61.15, -41.14), (-57.65, -37.64), (-61.15, -34.14))
            Line((-64.65, -34.14), (-61.15, -34.14))
        make_face()
        with Locations((-61.15, -37.64)):
            Circle(SKETCH036_R, mode=Mode.SUBTRACT)
        with BuildLine():
            Line((61.8428917544, -53.84), (61.8428917544, -60.84))
            Line((61.8428917544, -60.84), (54.8428917544, -60.84))
            Line((54.8428917544, -60.84), (54.8428917544, -57.34))
            ThreePointArc((58.3428917544, -53.84), (55.8680180203, -54.8651262658), (54.8428917544, -57.34))
            Line((61.8428917544, -53.84), (58.3428917544, -53.84))
        make_face()
        with Locations((58.3428917544, -57.34)):
            Circle(SKETCH036_R, mode=Mode.SUBTRACT)
        with BuildLine():
            Line((61.8428917544, 24.525), (61.8428917544, 17.525))
            Line((61.8428917544, 17.525), (58.3428917544, 17.525))
            ThreePointArc((54.8428917544, 21.025), (55.8680180203, 18.5501262658), (58.3428917544, 17.525))
            Line((54.8428917544, 24.525), (54.8428917544, 21.025))
            Line((54.8428917544, 24.525), (61.8428917544, 24.525))
        make_face()
        with Locations((58.3428917544, 21.025)):
            Circle(SKETCH036_R, mode=Mode.SUBTRACT)
    extrude(amount=-PAD016_DEPTH)

    # Sketch037 (on Vertex85 of Pad016) → Pocket005 (cut, through all)
    with BuildSketch(Plane(origin=(61.8428917544, 16.525, -11), x_dir=(0, 1, 0), z_dir=(1, 0, 0))):
        with BuildLine():
            Line((0, 0), (0, 3))
            Line((-5.5, 3), (0, 3))
            Line((-5.5, 3.6), (-5.5, 3))
            ThreePointArc((-5.5, 3.6), (-5.9100505063, 4.5899494937), (-6.9, 5))
            Line((-13.4, 5), (-6.9, 5))
            ThreePointArc((-13.4, 5), (-14.3899494937, 4.5899494937), (-14.8, 3.6))
            Line((-14.8, 3), (-14.8, 3.6))
            Line((-20.3, 3), (-14.8, 3))
            Line((-20.3, 3), (-20.3, 0))
            Line((-20.3, 0), (0, 0))
        make_face()
    extrude(amount=POCKET005_DEPTH, mode=Mode.SUBTRACT)

    # Sketch038 (on Vertex75 of Pocket005) → Pocket006 (cut, through all)
    with BuildSketch(Plane(origin=(48.8428917544, 24.525, -11), x_dir=(1, 0, 0), z_dir=(0, -1, 0))):
        with BuildLine():
            ThreePointArc((-3.6, 7), (-7, 10.4), (-10.4, 7))
            Line((-10.4, 7), (-10.4, 0))
            Line((-10.4, 0), (-3.6, 0))
            Line((-3.6, 0), (-3.6, 7))
        make_face()
    extrude(amount=-POCKET006_DEPTH, mode=Mode.SUBTRACT)

    # Fillet001
    fillet001_edges = [part.edges().sort_by_distance(p)[0] for p in [
        (-9.525, -62.34, 6),
        (-66.15, -43.815, 6),
        (63.342892, -62.34, -1),
        (66.342892, -53.260404, -1),
        (73.722939, -11.406074, -1),
        (63.342892, 26.025, -1),
        (-66.15, 26.025, -1),
        (-11.725, 30.775, -1),
        (11.725, 30.775, -1),
    ]]
    fillet(fillet001_edges, radius=FILLET001_R)


solid = part.part
